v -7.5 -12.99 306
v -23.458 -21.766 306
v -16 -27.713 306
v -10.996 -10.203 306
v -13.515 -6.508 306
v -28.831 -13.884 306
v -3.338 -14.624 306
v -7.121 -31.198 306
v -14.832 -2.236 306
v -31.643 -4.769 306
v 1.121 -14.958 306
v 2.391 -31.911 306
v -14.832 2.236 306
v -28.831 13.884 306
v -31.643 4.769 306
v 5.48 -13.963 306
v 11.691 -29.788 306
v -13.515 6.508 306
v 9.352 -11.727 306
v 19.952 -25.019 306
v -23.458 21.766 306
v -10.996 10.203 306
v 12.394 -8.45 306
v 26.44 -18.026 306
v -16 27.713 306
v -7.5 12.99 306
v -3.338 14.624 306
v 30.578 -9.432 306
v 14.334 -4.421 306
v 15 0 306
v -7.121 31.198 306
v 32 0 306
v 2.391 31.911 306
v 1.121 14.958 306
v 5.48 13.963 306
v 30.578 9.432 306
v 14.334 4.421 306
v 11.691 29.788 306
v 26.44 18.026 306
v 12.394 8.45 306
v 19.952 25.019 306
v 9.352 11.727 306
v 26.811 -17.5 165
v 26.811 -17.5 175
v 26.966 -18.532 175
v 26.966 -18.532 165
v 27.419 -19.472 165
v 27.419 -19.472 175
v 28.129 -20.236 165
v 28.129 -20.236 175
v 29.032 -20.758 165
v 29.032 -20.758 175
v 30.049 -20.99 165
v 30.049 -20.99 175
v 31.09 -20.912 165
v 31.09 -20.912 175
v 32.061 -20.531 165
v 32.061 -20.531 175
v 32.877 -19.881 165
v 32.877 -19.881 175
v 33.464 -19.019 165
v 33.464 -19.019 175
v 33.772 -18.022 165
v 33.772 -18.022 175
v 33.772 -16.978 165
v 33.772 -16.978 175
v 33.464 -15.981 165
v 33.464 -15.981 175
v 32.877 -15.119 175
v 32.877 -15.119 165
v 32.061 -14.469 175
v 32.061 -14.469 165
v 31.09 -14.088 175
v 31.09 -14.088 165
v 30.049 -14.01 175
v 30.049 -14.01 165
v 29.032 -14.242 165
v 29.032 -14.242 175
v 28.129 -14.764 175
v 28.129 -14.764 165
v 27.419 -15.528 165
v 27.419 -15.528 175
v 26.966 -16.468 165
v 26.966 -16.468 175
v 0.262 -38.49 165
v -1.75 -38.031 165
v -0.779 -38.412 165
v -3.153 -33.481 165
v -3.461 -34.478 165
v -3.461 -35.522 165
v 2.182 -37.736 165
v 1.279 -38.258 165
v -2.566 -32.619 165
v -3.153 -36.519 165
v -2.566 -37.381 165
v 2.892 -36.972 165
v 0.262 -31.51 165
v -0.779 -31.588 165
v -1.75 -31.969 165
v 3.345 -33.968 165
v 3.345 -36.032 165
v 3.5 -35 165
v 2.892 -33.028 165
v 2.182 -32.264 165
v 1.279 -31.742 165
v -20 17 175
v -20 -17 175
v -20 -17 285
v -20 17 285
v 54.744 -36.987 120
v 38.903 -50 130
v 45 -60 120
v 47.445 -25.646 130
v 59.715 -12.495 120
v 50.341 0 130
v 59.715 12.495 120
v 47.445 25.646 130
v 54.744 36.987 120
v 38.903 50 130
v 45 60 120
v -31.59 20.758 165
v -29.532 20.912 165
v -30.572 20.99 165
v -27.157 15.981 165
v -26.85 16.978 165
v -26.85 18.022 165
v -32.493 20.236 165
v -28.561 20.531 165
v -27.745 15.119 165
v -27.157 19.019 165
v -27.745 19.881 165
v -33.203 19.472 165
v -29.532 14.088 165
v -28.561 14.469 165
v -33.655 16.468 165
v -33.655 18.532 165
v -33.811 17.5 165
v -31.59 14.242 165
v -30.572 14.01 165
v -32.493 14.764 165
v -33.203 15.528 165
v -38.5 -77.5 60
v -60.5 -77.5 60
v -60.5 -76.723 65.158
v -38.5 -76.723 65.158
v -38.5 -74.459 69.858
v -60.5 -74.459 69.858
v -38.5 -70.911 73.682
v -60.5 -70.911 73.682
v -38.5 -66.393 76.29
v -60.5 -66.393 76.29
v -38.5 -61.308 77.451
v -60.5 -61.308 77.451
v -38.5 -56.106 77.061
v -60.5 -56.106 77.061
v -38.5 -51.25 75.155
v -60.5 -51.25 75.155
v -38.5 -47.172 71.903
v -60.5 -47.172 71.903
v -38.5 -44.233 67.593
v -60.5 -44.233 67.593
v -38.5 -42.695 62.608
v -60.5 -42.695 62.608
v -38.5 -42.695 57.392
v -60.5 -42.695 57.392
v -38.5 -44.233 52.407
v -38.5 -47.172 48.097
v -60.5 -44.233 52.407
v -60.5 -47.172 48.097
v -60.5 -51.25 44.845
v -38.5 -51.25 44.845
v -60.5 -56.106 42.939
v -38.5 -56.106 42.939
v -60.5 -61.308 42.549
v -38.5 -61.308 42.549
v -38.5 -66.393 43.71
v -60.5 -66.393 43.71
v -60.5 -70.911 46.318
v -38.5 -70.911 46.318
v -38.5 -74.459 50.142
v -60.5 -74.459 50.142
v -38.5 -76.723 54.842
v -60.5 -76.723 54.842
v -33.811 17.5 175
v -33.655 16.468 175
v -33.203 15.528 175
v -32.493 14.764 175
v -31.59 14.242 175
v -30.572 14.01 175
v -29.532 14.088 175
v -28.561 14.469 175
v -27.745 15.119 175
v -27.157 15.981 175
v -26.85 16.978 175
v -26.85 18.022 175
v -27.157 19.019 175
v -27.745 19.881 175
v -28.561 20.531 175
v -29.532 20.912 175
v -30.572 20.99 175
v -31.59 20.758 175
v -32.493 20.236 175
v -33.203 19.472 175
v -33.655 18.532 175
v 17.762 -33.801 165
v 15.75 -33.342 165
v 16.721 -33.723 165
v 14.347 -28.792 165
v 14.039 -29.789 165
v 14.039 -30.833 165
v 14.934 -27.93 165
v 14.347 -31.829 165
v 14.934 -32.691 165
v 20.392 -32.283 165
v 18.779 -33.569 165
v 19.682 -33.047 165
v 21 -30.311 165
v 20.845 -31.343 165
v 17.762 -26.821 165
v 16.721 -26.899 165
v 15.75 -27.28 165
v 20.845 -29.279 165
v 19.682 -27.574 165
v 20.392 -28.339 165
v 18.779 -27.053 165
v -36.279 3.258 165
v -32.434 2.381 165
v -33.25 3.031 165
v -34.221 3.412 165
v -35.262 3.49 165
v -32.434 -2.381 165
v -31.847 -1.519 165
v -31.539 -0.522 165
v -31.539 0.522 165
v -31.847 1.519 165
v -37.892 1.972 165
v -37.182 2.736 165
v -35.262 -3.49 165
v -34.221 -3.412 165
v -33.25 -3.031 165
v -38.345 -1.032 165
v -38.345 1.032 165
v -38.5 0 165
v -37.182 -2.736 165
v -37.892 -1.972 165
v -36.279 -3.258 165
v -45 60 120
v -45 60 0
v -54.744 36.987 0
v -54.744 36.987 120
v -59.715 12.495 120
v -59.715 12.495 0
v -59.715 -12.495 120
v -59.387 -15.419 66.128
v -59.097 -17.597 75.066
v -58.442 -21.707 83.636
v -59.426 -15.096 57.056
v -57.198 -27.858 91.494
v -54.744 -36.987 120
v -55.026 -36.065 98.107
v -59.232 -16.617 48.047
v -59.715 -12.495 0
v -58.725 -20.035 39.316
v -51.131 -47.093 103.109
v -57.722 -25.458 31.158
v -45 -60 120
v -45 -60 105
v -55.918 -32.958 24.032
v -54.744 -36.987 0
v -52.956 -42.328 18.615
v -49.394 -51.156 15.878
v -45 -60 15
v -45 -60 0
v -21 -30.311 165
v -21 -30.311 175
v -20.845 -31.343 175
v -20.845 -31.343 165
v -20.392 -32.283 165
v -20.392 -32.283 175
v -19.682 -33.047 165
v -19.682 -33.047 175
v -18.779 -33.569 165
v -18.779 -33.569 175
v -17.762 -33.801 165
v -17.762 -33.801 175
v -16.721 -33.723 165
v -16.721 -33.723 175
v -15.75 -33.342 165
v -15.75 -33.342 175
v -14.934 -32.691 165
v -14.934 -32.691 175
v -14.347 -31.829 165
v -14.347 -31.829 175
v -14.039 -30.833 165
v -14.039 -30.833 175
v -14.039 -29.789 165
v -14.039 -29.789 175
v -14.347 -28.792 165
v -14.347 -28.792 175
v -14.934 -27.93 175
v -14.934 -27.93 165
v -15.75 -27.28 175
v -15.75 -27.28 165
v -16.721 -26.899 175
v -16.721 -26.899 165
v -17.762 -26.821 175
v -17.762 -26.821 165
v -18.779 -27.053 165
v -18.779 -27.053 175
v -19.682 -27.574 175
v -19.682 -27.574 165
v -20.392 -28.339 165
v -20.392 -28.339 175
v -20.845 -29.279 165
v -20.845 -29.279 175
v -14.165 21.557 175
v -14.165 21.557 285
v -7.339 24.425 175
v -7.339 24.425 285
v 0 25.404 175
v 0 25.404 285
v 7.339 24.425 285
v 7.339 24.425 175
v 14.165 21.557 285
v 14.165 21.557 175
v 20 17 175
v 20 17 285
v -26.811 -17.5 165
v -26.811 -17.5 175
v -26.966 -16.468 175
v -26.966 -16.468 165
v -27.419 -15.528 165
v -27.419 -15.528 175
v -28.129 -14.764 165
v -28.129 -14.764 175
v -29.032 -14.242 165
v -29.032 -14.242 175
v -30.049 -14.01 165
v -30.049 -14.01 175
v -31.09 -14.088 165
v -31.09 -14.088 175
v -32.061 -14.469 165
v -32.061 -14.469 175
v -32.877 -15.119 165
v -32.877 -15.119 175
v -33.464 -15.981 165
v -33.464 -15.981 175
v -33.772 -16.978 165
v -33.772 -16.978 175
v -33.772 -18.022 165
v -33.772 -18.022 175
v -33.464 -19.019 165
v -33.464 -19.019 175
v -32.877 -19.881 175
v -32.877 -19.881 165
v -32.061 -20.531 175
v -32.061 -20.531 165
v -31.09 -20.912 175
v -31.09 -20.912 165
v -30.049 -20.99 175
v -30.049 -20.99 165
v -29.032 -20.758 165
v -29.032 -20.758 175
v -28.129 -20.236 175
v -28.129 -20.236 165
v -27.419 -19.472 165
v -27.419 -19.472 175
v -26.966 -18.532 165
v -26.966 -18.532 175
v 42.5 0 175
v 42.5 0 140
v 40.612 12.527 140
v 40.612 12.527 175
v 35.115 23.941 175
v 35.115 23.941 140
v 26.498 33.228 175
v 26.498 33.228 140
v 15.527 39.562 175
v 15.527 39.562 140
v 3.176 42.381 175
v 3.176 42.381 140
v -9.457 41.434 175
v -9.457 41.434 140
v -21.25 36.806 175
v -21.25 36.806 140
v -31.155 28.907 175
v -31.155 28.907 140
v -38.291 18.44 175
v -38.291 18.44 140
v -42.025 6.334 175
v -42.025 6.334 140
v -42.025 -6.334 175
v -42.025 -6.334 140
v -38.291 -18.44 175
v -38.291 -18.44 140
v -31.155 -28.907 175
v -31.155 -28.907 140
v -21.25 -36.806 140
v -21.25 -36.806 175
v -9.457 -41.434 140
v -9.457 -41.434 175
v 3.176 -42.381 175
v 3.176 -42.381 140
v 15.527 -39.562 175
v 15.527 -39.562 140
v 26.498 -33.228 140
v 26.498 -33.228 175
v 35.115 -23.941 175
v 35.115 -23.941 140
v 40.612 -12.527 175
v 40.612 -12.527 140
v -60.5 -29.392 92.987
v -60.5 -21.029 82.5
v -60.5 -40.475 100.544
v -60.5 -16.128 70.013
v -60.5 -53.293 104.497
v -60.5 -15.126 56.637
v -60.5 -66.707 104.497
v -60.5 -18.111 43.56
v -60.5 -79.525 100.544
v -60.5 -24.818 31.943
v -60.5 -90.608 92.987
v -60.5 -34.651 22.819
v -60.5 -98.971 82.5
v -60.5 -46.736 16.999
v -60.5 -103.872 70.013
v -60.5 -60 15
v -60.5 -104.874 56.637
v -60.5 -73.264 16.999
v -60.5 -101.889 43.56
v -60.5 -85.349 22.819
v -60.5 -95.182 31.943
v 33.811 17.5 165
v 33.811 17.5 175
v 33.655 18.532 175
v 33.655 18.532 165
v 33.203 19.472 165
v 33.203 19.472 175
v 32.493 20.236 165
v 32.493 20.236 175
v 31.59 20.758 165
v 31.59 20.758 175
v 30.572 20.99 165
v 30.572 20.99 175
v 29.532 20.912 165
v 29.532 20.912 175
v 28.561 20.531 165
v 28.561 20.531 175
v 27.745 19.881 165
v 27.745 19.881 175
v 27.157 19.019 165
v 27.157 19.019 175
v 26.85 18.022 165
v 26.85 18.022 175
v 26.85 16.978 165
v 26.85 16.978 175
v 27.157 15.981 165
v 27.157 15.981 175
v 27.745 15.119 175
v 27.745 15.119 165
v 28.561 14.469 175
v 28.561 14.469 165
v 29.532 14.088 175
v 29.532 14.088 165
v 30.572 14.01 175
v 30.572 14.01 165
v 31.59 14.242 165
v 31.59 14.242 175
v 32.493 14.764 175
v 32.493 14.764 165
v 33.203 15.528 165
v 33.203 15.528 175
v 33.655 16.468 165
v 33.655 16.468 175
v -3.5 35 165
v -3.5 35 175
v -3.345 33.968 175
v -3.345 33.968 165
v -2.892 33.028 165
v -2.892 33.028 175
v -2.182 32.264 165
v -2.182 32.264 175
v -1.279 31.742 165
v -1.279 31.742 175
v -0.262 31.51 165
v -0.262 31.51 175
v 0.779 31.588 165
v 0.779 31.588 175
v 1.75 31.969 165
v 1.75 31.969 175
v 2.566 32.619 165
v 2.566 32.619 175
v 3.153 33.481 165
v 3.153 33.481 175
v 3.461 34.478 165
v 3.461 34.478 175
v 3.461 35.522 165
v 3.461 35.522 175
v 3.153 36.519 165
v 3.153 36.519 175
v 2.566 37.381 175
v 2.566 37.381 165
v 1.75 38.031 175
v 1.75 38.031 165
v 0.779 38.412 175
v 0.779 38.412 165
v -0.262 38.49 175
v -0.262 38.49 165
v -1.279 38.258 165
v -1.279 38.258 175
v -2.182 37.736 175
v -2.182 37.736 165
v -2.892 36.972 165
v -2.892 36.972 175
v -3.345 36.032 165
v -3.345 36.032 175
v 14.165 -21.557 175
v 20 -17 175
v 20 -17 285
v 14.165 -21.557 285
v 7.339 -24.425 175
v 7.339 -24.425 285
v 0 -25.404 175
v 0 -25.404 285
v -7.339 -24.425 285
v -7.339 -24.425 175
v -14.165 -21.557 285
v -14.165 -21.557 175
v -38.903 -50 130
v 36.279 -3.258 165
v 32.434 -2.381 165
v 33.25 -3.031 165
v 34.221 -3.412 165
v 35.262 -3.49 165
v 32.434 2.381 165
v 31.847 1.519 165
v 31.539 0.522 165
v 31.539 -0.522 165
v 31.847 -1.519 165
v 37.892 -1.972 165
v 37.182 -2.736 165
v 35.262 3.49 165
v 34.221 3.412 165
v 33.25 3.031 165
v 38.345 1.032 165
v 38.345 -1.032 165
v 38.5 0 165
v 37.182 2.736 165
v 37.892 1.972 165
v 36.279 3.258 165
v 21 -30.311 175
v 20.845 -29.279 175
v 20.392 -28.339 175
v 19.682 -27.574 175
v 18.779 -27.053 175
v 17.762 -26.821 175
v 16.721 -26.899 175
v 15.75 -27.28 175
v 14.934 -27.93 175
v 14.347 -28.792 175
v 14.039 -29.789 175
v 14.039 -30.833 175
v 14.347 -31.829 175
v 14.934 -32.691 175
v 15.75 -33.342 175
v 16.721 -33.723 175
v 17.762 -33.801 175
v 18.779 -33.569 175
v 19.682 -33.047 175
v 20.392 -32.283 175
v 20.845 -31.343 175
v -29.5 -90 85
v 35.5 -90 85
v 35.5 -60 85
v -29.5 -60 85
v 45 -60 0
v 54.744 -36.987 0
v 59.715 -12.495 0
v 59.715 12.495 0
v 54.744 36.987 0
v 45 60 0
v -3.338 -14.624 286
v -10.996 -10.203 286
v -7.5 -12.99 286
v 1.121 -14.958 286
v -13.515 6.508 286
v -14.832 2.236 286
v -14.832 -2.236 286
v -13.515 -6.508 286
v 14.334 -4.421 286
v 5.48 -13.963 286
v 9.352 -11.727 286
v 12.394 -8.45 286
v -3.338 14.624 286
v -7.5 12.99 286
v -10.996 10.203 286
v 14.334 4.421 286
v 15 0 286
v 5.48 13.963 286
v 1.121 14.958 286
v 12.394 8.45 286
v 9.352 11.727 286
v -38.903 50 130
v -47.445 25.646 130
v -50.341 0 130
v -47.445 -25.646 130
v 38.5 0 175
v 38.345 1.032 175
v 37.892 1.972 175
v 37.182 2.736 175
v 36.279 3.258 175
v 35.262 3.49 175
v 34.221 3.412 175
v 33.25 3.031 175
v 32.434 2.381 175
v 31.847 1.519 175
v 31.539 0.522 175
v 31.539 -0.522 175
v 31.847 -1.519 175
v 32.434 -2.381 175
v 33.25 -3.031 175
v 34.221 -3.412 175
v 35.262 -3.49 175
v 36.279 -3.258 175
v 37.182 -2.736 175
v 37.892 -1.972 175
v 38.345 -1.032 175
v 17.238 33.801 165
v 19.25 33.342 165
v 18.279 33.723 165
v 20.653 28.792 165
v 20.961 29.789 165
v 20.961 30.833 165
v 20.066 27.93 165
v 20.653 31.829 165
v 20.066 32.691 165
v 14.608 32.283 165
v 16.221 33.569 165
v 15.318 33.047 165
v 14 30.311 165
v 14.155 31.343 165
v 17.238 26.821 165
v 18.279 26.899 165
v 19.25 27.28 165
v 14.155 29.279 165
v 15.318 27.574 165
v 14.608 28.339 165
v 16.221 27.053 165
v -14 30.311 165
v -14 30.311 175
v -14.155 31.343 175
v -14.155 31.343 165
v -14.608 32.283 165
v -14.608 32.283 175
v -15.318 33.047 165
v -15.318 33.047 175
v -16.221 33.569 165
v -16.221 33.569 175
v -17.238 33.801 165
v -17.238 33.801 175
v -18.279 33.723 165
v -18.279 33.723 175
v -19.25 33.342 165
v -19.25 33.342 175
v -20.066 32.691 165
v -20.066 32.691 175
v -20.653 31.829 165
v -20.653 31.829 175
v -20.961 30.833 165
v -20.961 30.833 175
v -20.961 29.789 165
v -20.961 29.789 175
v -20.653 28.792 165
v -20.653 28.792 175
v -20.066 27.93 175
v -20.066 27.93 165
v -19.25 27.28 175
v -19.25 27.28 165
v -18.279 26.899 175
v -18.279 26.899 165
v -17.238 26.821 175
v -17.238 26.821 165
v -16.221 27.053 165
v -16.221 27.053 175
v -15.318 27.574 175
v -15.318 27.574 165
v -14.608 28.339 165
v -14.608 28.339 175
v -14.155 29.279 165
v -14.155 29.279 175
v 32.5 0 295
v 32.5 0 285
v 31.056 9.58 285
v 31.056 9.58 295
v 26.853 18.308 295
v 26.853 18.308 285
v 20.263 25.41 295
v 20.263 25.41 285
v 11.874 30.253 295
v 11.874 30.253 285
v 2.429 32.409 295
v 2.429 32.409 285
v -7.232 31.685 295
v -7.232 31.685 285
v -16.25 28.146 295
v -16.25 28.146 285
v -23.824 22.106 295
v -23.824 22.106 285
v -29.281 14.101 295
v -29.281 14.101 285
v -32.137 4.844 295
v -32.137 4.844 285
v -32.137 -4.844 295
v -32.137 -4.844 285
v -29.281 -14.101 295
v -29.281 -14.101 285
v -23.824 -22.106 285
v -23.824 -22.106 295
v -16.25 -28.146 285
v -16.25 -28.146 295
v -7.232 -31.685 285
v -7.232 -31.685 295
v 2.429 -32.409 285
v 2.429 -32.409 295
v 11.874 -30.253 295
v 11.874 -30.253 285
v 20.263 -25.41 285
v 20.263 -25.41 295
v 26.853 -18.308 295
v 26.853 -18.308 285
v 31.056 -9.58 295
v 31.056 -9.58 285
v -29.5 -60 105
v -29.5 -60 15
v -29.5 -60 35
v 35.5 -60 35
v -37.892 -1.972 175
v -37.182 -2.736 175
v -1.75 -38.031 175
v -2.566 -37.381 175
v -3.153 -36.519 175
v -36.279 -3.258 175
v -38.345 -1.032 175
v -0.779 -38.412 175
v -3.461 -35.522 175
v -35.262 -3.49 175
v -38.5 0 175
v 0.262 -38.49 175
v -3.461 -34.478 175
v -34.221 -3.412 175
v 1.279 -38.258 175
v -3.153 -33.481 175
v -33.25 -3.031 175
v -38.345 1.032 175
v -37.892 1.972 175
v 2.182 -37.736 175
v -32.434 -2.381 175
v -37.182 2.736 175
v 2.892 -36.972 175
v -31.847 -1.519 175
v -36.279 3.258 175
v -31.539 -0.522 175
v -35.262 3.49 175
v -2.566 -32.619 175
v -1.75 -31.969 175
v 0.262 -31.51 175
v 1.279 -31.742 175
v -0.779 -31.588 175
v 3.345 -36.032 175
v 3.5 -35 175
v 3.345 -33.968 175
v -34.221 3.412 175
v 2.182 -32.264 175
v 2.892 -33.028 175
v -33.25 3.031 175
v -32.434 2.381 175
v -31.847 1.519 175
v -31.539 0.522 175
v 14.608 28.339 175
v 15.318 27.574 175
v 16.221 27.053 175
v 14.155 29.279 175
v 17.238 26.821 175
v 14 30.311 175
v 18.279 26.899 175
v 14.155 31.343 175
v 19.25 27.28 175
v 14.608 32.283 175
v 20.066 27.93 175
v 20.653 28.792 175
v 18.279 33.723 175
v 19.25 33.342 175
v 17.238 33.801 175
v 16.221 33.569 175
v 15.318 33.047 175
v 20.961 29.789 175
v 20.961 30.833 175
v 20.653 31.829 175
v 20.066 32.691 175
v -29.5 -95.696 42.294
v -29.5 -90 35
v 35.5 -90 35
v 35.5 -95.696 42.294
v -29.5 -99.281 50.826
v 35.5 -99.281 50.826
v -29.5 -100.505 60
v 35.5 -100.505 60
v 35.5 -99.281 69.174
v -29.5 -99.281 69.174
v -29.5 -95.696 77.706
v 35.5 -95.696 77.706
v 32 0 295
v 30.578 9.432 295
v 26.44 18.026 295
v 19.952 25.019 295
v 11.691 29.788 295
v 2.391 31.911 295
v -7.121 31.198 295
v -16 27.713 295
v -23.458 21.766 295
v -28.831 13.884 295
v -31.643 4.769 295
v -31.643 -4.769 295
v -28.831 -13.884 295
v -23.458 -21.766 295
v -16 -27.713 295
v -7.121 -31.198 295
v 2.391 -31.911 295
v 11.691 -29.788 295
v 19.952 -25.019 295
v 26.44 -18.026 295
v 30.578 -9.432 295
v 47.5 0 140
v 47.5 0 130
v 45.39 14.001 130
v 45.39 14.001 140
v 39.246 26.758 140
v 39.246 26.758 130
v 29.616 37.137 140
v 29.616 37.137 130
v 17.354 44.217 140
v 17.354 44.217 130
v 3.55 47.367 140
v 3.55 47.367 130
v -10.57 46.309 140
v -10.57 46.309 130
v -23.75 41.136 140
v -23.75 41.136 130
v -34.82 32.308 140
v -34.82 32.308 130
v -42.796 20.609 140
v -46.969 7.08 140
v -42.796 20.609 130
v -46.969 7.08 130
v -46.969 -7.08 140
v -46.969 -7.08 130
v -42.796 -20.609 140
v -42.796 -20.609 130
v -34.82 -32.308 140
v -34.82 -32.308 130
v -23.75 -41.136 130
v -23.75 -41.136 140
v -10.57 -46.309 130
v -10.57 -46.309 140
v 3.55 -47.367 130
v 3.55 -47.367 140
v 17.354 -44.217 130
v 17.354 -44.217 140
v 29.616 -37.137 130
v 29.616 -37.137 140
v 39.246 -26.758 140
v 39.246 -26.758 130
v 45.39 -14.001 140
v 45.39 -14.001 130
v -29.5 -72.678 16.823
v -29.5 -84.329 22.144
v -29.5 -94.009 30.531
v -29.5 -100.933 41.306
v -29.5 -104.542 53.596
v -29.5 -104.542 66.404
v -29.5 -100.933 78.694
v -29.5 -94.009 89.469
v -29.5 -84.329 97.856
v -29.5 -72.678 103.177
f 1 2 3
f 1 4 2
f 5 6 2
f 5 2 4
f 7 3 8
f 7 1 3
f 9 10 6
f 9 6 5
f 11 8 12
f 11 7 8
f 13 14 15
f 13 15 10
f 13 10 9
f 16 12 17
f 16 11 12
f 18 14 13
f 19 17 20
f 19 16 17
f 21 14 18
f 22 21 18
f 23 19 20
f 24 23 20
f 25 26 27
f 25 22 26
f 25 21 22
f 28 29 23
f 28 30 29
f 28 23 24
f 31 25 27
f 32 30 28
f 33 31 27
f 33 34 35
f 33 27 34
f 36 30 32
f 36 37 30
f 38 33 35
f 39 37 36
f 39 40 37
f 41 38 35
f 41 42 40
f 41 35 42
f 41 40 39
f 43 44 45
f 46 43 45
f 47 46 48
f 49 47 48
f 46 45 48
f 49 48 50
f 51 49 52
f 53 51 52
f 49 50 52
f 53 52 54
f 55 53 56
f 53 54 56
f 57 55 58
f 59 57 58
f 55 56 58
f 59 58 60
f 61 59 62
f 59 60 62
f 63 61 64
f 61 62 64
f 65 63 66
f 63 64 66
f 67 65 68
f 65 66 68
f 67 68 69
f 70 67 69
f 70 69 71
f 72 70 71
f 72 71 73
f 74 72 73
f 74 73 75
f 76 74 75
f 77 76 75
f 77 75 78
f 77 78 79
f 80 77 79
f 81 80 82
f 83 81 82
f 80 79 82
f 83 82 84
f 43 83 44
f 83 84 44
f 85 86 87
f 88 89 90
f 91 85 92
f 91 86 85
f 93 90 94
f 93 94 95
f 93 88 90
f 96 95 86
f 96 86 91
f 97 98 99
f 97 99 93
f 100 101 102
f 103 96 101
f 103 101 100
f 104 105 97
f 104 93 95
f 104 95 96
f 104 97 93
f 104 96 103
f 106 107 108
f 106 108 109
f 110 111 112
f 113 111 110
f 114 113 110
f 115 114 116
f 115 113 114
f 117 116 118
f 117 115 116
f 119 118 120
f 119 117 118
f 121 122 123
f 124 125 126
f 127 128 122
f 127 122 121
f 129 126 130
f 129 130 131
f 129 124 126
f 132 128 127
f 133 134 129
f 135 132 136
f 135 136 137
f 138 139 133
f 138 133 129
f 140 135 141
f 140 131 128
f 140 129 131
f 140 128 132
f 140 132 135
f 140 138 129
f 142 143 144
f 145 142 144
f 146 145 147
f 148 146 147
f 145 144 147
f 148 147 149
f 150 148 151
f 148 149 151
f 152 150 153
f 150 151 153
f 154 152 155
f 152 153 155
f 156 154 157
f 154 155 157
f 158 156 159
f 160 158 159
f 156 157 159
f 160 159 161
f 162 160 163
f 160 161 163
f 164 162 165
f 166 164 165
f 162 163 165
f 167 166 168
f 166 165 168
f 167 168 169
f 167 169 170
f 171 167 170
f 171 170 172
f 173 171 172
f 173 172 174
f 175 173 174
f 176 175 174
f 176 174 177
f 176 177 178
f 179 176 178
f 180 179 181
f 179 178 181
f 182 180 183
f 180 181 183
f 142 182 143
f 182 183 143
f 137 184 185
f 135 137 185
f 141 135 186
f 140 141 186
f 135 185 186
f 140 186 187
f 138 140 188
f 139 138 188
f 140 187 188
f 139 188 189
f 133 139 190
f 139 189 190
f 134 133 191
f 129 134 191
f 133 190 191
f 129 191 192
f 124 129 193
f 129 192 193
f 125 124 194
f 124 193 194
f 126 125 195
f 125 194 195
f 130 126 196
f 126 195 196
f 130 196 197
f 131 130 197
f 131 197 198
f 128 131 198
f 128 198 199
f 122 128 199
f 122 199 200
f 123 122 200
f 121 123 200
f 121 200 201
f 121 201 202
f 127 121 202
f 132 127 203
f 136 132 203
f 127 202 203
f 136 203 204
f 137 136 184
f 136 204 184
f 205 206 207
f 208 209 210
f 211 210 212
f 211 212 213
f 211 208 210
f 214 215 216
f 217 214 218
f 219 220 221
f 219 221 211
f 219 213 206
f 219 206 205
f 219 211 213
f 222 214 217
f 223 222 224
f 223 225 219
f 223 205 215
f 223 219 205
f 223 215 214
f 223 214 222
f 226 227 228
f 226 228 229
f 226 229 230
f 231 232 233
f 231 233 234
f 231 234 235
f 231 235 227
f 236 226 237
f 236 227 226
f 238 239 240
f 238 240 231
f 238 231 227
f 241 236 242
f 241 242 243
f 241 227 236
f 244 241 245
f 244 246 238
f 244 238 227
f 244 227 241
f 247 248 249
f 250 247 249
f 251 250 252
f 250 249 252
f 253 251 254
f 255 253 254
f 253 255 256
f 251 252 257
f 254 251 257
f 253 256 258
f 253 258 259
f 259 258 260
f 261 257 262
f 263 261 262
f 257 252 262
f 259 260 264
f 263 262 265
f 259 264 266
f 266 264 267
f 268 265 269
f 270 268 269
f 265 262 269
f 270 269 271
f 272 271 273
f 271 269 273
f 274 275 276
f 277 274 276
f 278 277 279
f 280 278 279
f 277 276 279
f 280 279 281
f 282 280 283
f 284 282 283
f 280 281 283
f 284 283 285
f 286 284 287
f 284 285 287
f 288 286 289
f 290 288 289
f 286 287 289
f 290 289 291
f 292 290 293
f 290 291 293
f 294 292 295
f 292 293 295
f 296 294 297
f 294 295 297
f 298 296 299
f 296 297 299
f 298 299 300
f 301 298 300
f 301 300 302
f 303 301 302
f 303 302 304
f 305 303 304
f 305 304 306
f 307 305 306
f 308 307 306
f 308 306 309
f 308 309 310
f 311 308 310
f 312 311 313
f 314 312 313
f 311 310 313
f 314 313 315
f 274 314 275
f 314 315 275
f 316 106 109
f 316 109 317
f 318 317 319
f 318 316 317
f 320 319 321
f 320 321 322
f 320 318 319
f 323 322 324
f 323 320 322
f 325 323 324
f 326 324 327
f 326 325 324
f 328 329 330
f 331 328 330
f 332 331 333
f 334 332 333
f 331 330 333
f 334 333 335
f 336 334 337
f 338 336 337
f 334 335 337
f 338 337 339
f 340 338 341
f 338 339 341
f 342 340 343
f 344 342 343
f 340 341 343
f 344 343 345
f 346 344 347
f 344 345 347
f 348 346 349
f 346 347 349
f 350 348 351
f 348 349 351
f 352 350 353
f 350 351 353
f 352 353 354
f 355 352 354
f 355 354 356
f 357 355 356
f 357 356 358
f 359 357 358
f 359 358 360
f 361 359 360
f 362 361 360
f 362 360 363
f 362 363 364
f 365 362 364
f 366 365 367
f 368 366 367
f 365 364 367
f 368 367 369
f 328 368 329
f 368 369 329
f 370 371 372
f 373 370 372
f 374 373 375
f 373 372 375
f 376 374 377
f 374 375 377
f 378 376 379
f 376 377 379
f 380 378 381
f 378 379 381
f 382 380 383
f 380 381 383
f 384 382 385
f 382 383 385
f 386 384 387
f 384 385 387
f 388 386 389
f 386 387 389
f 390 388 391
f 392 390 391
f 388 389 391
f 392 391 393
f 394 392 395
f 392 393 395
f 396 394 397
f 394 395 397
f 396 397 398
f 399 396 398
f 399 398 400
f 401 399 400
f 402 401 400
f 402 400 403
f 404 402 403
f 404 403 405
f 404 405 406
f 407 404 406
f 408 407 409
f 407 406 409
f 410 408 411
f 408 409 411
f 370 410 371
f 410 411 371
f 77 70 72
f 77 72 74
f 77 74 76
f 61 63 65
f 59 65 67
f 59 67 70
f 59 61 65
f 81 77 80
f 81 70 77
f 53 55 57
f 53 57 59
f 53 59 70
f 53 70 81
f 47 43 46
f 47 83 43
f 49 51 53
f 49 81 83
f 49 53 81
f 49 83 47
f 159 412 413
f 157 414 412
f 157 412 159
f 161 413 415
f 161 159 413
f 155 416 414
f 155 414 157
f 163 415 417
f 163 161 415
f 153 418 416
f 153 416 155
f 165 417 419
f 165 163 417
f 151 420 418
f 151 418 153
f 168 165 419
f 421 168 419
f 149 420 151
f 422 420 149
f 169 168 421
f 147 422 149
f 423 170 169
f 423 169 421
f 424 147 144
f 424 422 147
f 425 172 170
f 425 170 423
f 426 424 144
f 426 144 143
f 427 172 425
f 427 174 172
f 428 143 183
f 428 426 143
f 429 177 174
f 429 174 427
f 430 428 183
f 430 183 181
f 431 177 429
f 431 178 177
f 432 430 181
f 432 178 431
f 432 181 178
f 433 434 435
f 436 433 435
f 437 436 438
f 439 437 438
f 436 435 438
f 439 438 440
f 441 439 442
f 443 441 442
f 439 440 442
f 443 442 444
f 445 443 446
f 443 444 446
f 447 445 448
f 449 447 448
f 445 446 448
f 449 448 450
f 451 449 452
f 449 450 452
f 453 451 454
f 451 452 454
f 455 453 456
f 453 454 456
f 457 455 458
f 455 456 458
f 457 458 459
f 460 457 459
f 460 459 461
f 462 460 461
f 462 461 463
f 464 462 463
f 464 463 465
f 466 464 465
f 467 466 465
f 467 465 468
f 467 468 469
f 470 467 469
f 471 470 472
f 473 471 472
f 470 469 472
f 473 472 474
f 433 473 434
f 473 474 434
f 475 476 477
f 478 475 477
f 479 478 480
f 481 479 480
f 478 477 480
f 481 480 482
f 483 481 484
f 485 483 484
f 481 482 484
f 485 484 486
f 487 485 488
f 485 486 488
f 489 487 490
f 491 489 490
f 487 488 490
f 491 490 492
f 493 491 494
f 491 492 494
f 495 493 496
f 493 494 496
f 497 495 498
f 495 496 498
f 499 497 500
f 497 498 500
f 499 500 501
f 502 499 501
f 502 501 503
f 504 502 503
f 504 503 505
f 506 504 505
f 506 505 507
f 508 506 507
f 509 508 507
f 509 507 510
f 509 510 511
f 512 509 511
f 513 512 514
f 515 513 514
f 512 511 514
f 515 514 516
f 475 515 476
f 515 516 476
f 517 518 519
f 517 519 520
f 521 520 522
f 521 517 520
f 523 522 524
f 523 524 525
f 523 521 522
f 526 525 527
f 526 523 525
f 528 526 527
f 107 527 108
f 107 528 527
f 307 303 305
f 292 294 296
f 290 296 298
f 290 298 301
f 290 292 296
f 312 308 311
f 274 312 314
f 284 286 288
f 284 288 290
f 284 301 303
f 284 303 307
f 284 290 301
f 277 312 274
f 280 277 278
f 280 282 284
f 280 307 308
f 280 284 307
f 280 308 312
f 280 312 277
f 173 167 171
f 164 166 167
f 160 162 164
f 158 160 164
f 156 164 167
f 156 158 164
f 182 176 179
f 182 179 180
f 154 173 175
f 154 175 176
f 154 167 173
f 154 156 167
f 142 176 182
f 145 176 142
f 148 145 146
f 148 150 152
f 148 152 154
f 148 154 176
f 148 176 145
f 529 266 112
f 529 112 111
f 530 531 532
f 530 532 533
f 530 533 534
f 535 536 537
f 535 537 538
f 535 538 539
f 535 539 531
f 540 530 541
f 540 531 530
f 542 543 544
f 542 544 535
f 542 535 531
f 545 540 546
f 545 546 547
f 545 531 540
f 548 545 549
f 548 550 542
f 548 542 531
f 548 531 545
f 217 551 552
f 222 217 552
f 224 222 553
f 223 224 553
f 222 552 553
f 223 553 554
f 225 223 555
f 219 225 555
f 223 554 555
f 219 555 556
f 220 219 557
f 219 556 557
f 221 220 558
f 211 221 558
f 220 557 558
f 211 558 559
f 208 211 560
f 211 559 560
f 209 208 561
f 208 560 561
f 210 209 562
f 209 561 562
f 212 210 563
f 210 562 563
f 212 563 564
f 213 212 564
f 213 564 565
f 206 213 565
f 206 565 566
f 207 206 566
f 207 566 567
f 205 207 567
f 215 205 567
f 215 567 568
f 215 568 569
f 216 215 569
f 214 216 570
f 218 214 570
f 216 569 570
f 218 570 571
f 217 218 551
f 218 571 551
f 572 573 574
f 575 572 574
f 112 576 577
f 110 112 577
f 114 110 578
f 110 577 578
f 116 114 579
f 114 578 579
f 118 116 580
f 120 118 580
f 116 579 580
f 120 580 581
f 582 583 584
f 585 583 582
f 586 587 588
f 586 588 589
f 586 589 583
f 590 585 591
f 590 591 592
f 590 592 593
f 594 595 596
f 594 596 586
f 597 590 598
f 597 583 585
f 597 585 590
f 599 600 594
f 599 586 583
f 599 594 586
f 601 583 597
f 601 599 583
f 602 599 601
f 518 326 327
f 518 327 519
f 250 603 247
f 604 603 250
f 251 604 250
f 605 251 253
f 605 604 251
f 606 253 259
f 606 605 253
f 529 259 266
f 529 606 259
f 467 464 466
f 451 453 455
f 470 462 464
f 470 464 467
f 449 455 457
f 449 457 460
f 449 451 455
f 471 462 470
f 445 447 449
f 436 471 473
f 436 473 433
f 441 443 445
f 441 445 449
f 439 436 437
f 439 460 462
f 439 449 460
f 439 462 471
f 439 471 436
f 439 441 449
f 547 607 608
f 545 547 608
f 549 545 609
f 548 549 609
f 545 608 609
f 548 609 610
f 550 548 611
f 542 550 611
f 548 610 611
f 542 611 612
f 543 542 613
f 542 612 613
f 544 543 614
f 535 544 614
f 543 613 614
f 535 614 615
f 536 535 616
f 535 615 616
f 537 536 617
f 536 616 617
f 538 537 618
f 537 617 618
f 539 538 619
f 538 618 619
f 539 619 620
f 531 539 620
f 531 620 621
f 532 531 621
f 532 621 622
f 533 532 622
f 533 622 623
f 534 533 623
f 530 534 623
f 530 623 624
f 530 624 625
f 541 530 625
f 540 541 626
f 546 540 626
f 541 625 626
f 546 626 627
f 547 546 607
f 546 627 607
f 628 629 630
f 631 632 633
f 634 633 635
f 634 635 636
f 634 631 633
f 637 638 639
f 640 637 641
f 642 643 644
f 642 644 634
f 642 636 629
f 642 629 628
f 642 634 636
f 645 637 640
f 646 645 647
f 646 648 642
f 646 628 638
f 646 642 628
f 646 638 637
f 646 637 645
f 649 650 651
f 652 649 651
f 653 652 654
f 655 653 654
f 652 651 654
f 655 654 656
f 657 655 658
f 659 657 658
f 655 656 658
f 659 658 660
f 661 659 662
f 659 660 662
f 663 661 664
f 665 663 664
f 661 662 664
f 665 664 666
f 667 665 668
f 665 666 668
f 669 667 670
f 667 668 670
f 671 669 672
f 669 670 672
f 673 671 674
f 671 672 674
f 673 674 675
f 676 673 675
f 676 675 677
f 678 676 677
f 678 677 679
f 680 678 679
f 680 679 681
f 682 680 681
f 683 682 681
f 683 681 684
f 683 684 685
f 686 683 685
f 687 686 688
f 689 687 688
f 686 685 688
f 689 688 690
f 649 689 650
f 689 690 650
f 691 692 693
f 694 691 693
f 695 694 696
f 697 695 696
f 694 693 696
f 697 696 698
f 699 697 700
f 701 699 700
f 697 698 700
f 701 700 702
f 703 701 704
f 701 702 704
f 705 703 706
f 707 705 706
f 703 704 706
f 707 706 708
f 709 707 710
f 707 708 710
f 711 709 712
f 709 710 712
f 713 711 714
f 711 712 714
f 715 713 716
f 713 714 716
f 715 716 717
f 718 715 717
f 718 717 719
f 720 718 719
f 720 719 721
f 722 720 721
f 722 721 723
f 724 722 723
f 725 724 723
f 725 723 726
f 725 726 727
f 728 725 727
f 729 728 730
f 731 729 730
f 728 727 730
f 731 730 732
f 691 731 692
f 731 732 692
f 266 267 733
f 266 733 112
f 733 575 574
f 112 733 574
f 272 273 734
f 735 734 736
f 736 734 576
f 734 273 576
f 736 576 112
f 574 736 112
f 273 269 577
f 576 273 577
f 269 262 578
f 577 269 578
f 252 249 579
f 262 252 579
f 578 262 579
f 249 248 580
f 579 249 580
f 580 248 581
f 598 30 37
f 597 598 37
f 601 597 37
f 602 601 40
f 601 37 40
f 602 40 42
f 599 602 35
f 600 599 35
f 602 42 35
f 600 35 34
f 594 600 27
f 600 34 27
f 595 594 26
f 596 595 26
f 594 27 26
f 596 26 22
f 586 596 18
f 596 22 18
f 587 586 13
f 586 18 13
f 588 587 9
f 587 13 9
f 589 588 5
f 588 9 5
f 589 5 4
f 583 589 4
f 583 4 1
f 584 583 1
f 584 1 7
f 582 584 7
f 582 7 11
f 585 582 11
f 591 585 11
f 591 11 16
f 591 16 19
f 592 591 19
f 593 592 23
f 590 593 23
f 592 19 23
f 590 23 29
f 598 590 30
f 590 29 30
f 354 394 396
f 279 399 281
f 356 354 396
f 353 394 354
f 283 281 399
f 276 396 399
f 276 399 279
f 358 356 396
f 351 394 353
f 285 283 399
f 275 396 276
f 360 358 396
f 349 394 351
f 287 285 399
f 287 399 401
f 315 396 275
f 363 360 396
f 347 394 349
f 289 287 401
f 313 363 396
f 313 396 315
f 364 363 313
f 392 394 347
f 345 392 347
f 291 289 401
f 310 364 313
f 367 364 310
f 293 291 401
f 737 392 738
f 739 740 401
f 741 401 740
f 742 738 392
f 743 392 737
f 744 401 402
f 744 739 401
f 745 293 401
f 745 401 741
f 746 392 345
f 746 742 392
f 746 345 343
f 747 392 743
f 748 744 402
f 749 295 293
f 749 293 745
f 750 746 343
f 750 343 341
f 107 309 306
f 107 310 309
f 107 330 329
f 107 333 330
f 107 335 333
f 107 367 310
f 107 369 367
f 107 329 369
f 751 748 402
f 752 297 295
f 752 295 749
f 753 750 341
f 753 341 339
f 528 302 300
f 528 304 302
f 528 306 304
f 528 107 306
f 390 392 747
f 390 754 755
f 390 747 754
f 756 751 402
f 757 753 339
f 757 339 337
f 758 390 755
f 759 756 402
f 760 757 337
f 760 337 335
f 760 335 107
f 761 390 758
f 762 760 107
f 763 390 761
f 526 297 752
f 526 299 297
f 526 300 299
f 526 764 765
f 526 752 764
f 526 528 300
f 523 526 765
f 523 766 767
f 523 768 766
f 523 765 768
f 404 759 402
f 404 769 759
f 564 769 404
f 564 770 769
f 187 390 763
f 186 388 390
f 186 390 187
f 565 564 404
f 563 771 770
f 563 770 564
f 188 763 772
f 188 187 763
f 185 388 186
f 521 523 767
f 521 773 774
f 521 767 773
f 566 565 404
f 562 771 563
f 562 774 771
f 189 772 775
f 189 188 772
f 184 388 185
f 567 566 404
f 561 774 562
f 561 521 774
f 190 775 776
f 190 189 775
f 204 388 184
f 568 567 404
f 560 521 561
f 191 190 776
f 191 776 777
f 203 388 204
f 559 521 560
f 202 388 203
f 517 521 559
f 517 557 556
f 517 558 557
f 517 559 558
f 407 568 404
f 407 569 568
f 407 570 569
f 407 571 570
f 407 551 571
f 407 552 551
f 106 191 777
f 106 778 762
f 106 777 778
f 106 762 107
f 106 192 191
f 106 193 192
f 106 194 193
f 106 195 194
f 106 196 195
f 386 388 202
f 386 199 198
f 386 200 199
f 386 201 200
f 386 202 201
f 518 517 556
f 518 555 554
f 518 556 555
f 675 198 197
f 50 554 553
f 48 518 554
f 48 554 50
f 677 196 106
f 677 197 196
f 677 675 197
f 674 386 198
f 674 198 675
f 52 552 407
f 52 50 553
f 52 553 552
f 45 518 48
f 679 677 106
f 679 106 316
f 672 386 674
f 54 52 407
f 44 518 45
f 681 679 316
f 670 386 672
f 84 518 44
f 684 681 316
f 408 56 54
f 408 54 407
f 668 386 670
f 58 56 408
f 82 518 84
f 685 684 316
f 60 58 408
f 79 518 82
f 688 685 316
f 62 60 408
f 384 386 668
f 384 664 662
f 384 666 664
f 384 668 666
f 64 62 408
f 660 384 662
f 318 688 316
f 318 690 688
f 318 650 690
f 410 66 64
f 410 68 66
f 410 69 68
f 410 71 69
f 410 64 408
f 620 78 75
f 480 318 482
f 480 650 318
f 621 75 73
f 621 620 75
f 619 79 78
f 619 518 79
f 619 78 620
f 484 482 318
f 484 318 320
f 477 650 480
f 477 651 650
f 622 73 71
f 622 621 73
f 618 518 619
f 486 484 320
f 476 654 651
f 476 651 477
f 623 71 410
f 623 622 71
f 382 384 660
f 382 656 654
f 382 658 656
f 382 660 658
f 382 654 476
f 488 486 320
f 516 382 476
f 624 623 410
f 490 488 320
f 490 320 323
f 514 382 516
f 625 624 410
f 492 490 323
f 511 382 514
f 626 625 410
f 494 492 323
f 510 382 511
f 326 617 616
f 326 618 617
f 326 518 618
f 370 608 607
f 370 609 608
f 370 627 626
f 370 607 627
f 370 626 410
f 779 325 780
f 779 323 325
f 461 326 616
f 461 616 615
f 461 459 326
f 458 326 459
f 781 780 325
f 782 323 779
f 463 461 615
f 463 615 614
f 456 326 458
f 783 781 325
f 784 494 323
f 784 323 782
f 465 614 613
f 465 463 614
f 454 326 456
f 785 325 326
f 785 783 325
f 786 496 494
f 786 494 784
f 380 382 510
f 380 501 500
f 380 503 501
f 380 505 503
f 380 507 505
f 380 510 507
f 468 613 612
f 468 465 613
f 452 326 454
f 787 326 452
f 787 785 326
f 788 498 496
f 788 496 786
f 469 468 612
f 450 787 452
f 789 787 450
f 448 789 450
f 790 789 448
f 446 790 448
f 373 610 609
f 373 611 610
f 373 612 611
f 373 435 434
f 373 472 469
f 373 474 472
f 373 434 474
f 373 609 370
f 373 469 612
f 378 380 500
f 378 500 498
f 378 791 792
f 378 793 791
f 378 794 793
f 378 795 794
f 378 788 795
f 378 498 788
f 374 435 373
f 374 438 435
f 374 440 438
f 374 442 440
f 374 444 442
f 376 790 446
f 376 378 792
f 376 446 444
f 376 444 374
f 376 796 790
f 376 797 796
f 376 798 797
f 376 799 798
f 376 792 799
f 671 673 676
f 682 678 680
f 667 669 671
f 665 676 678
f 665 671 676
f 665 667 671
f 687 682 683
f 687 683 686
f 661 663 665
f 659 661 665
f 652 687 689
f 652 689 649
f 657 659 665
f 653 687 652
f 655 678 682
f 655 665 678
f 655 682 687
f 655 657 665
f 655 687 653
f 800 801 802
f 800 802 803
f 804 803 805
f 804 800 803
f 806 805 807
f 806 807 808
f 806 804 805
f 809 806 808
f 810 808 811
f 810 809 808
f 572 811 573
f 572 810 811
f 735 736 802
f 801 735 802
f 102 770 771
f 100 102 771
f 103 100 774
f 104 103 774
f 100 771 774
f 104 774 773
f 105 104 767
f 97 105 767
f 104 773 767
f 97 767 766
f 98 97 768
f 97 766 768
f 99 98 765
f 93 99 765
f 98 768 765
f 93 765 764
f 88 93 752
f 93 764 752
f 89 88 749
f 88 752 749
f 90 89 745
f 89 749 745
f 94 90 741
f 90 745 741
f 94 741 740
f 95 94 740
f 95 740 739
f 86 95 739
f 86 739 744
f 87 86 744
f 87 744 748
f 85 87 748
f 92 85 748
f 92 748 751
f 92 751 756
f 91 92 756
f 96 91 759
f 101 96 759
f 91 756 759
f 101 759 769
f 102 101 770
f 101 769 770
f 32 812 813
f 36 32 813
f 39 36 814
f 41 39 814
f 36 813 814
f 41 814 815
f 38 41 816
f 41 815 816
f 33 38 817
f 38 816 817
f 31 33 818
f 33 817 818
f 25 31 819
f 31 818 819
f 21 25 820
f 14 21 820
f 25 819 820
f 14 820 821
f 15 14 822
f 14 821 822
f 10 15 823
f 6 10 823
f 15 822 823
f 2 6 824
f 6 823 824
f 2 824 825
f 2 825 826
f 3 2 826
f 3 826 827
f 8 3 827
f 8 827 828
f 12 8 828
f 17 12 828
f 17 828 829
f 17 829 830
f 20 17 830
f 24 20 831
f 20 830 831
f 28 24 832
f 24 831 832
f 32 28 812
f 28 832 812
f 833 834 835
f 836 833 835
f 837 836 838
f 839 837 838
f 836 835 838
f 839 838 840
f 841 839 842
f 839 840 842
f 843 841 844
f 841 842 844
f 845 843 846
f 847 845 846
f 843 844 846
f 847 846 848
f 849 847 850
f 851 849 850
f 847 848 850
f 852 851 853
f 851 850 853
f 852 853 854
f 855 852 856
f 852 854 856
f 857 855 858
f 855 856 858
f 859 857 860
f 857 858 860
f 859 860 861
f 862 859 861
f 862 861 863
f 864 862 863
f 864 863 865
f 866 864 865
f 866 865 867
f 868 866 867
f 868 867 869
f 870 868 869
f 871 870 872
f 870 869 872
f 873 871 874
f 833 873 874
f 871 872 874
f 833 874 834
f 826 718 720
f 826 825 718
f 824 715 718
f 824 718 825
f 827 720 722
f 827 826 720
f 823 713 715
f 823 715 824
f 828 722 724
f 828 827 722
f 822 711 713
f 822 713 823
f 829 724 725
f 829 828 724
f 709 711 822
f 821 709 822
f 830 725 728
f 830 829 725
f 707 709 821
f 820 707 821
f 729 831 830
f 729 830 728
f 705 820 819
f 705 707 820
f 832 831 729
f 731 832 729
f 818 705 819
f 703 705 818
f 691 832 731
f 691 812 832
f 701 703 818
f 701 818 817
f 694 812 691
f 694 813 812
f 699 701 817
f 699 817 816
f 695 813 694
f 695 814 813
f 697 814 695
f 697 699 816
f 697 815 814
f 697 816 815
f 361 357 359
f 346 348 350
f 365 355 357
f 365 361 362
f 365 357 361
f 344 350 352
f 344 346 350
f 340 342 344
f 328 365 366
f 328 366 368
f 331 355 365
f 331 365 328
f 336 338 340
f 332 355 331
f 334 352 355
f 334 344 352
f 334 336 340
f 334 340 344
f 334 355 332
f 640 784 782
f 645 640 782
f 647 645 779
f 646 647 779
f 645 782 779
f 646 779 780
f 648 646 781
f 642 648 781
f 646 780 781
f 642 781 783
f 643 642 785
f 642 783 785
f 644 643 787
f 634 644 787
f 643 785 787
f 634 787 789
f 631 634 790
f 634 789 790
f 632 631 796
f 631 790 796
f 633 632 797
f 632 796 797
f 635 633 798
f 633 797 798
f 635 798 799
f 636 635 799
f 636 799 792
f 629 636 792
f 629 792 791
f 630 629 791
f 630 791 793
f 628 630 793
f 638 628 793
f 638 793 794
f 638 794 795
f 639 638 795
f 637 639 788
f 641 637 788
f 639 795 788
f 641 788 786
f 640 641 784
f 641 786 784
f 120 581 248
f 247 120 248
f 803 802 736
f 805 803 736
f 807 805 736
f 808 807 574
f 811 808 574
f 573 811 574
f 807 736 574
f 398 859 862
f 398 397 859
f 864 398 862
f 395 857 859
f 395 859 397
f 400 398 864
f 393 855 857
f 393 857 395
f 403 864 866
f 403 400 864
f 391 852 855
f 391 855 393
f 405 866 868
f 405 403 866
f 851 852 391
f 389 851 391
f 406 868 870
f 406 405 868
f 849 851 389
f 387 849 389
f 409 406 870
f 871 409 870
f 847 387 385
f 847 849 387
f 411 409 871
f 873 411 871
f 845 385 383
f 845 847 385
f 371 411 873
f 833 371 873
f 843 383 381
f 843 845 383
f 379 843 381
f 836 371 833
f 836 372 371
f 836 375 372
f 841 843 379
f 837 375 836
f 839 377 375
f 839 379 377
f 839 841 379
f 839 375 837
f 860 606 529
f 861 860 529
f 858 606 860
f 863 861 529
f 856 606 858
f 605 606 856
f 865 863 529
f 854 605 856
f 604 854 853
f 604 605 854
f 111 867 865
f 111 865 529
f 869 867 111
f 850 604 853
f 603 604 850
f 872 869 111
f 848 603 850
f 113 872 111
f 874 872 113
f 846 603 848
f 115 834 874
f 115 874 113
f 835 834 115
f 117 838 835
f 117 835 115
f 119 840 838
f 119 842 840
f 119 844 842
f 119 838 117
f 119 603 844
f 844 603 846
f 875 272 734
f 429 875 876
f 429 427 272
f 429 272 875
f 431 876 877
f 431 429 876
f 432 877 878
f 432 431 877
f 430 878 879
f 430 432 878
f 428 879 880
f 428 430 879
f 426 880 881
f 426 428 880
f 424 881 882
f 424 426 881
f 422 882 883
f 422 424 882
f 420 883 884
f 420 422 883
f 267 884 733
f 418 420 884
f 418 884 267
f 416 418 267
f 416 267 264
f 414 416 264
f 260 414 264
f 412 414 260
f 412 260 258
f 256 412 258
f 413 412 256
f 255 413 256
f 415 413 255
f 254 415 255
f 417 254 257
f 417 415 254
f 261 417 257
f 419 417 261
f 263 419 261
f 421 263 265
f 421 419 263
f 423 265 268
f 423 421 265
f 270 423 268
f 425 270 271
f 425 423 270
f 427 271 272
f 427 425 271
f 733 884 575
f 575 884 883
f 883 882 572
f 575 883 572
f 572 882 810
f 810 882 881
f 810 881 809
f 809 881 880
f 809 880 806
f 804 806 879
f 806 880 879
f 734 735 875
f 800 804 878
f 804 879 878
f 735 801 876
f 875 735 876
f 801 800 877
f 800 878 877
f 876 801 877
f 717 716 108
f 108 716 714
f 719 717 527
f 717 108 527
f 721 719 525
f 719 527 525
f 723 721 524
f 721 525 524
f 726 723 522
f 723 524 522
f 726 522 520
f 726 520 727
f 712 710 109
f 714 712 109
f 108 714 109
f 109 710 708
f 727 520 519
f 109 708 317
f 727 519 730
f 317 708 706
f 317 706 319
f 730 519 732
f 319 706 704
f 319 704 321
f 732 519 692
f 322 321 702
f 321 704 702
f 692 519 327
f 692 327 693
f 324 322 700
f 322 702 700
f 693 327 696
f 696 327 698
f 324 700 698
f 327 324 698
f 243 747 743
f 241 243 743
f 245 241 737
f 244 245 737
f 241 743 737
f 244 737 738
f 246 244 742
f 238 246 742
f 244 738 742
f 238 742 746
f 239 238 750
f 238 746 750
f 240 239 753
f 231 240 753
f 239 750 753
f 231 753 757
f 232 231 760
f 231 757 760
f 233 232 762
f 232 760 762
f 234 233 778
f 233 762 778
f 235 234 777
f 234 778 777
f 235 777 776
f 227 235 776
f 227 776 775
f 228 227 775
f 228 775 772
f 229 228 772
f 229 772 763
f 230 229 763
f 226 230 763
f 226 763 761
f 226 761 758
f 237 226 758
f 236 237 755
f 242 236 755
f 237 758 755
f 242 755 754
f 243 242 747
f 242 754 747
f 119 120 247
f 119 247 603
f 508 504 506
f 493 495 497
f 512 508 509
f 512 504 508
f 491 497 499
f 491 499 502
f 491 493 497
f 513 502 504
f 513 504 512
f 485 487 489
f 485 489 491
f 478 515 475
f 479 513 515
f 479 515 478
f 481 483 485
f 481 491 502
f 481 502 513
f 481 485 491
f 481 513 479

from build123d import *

# Parameters (mm, degrees)
BOSS_EXTRUDE1_DEPTH  = 120
BOSS_EXTRUDE2_DEPTH  = 10
BOSS_EXTRUDE2_TAPER  = 45
SKETCH3_R            = 47.5
BOSS_EXTRUDE3_DEPTH  = 10
SKETCH4_R            = 42.5
BOSS_EXTRUDE4_DEPTH  = 35
SKETCH5_R            = 3.5
CUT_EXTRUDE1_DEPTH   = 10
BOSS_EXTRUDE5_DEPTH  = 110
SKETCH7_R            = 32.5
BOSS_EXTRUDE6_DEPTH  = 10
SKETCH8_R            = 32
BOSS_EXTRUDE7_DEPTH  = 11
SKETCH10_R           = 45
BOSS_EXTRUDE9_DEPTH  = 15.5
BOSS_EXTRUDE10_DEPTH = 65
SKETCH12_R           = 15
CUT_EXTRUDE2_DEPTH   = 20
SKETCH13_R           = 17.5
CUT_EXTRUDE3_DEPTH   = 22


with BuildPart() as part:
    # Sketch1 → Boss-Extrude1 (new body)
    with BuildSketch(Plane.XY):
        with BuildLine():
            Line((45, 60), (-45, 60))
            ThreePointArc((-45, 60), (-60.341439003, 0), (-45, -60))
            Line((-45, -60), (45, -60))
            ThreePointArc((45, -60), (60.341439003, 0), (45, 60))
        make_face()
    extrude(amount=BOSS_EXTRUDE1_DEPTH)

    # Sketch2 → Boss-Extrude2 (add)
    with BuildSketch(Plane.XY.offset(120)):
        with BuildLine():
            Line((45, 60), (-45, 60))
            ThreePointArc((-45, 60), (-60.341439003, 0), (-45, -60))
            Line((-45, -60), (45, -60))
            ThreePointArc((45, -60), (60.341439003, 0), (45, 60))
        make_face()
    extrude(amount=BOSS_EXTRUDE2_DEPTH, taper=BOSS_EXTRUDE2_TAPER)

    # Sketch3 → Boss-Extrude3 (add)
    with BuildSketch(Plane.XY.offset(130)):
        Circle(SKETCH3_R)
    extrude(amount=BOSS_EXTRUDE3_DEPTH)

    # Sketch4 → Boss-Extrude4 (add)
    with BuildSketch(Plane.XY.offset(140)):
        Circle(SKETCH4_R)
    extrude(amount=BOSS_EXTRUDE4_DEPTH)

    # Sketch5 → Cut-Extrude1 (cut)
    with BuildSketch(Plane.XY.offset(175)):
        with Locations((35, 0)):
            Circle(SKETCH5_R)
        with Locations(Location((0, 35, 0), (0, 0, 180))):
            Circle(SKETCH5_R)
        with Locations((30.310889132, 17.5)):
            Circle(SKETCH5_R)
        with Locations(Location((17.5, 30.310889132, 0), (0, 0, 180))):
            Circle(SKETCH5_R)
        with Locations(Location((30.310889132, -17.5, 0), (0, 0, 180))):
            Circle(SKETCH5_R)
        with Locations((17.5, -30.310889132)):
            Circle(SKETCH5_R)
        with Locations((0, -35)):
            Circle(SKETCH5_R)
        with Locations(Location((-17.5, -30.310889132, 0), (0, 0, 180))):
            Circle(SKETCH5_R)
        with Locations((-30.310889132, -17.5)):
            Circle(SKETCH5_R)
        with Locations(Location((-35, 0, 0), (0, 0, 180))):
            Circle(SKETCH5_R)
        with Locations(Location((-30.310889132, 17.5, 0), (0, 0, 180))):
            Circle(SKETCH5_R)
        with Locations((-17.5, 30.310889132)):
            Circle(SKETCH5_R)
    extrude(amount=-CUT_EXTRUDE1_DEPTH, mode=Mode.SUBTRACT)

    # Sketch6 → Boss-Extrude5 (add)
    with BuildSketch(Plane.XY.offset(175)):
        with BuildLine():
            Line((-20, -17), (-20, 17))
            ThreePointArc((-20, 17), (0, 25.404082058), (20, 17))
            Line((20, 17), (20, -17))
            ThreePointArc((20, -17), (0, -25.404082058), (-20, -17))
        make_face()
    extrude(amount=BOSS_EXTRUDE5_DEPTH)

    # Sketch7 → Boss-Extrude6 (add)
    with BuildSketch(Plane.XY.offset(285)):
        Circle(SKETCH7_R)
    extrude(amount=BOSS_EXTRUDE6_DEPTH)

    # Sketch8 → Boss-Extrude7 (add)
    with BuildSketch(Plane.XY.offset(295)):
        Circle(SKETCH8_R)
    extrude(amount=BOSS_EXTRUDE7_DEPTH)

    # Sketch10 → Boss-Extrude9 (add, symmetric)
    with BuildSketch(Plane.ZY.offset(45)):
        with Locations(Location((60, -60, 0), (0, 0, 180))):
            Circle(SKETCH10_R)
    extrude(amount=BOSS_EXTRUDE9_DEPTH, both=True)

    # Sketch11 → Boss-Extrude10 (add)
    with BuildSketch(Plane(origin=(-29.5, 0, 0), x_dir=(0, 0, -1), z_dir=(1, 0, 0))):
        with BuildLine():
            Line((-85, -60), (-35, -60))
            Line((-35, -60), (-35, -90))
            ThreePointArc((-35, -90), (-60, -100.505102572), (-85, -90))
            Line((-85, -90), (-85, -60))
        make_face()
    extrude(amount=BOSS_EXTRUDE10_DEPTH)

    # Sketch12 → Cut-Extrude2 (cut)
    with BuildSketch(Plane.XY.offset(306)):
        Circle(SKETCH12_R)
    extrude(amount=-CUT_EXTRUDE2_DEPTH, mode=Mode.SUBTRACT)

    # Sketch13 → Cut-Extrude3 (cut)
    with BuildSketch(Plane.ZY.offset(60.5)):
        with Locations(Location((60, -60, 0), (0, 0, 270))):
            Circle(SKETCH13_R)
    extrude(amount=-CUT_EXTRUDE3_DEPTH, mode=Mode.SUBTRACT)


solid = part.part
